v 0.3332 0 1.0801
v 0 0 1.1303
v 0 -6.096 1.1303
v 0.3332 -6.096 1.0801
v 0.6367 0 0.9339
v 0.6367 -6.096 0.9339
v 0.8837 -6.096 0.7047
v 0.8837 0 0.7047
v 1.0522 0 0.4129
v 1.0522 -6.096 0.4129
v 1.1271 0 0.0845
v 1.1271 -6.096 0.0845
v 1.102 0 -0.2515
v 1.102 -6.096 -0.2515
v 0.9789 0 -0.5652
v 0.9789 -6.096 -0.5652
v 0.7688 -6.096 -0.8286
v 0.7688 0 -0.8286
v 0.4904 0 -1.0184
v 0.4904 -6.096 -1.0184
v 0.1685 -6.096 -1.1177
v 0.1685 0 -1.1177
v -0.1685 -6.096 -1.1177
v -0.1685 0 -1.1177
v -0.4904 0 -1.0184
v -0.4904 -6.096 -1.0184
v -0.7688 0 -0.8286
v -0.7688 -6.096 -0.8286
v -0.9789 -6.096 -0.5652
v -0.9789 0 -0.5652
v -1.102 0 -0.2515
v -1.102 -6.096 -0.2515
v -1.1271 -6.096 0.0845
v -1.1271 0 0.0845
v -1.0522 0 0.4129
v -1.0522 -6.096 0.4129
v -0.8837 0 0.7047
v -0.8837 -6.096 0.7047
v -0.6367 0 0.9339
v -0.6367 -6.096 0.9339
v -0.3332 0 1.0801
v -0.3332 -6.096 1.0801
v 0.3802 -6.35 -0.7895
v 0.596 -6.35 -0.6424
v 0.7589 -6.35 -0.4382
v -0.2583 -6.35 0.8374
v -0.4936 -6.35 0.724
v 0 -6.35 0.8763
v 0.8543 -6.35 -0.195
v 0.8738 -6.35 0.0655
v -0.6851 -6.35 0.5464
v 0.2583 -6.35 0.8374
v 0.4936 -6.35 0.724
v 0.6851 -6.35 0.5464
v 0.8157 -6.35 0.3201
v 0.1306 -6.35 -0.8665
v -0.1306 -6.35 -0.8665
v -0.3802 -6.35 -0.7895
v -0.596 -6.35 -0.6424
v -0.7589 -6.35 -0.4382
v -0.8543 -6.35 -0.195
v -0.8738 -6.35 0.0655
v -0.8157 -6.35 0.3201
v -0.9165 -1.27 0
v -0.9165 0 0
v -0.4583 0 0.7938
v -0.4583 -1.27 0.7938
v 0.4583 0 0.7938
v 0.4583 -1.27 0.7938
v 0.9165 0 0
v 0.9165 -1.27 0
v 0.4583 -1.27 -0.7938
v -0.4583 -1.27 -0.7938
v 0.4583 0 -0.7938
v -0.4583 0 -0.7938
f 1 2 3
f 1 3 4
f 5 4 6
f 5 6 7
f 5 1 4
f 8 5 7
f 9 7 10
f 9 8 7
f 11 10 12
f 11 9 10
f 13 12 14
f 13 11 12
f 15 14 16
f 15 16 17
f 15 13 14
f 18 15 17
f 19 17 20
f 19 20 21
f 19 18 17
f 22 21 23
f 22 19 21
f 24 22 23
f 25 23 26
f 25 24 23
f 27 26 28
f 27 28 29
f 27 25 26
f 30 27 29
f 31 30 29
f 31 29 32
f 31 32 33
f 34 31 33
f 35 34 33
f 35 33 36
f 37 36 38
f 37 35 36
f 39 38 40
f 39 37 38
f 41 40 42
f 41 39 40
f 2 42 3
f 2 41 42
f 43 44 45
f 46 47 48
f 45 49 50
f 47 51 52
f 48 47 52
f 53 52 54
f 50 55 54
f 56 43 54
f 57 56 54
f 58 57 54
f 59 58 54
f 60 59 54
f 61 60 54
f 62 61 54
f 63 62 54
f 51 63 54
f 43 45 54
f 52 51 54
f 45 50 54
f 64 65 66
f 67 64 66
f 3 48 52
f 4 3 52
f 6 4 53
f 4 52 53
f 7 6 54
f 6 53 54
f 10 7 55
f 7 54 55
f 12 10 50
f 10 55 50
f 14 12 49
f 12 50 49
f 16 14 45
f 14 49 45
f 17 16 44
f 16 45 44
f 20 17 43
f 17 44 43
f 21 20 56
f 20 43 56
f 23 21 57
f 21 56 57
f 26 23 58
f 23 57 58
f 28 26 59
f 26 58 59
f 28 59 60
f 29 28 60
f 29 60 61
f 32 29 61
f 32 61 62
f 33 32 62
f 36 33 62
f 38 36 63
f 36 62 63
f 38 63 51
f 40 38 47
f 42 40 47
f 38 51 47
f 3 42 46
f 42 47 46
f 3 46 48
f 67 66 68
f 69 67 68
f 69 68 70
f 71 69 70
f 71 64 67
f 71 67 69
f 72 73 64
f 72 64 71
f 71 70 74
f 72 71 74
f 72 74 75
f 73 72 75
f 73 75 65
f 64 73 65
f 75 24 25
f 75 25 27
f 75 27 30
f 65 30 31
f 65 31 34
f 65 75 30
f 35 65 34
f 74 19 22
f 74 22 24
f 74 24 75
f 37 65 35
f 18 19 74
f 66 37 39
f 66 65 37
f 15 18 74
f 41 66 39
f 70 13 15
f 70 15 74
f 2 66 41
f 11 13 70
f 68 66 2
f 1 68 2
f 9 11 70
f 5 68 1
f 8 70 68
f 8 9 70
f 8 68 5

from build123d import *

# Parameters (mm, degrees)
SKETCH1_R           = 1.1303
BOSS_EXTRUDE1_DEPTH = 6.35
CHAMFER1_SIZE       = 0.254
CUT_EXTRUDE1_DEPTH  = 1.27


with BuildPart() as part:
    # Sketch1 → Boss-Extrude1 (new body)
    with BuildSketch(Plane(origin=(0, 0, 0), x_dir=(1, 0, 0), z_dir=(0, 1, 0))):
        with Locations(Location((0, 0, 0), (0, 0, 270))):
            Circle(SKETCH1_R)
    extrude(amount=-BOSS_EXTRUDE1_DEPTH)

    # Chamfer1
    chamfer1_edges = [part.edges().sort_by_distance(p)[0] for p in [
        (0, -6.35, -1.1303),
    ]]
    chamfer(chamfer1_edges, length=CHAMFER1_SIZE)

    # Sketch2 → Cut-Extrude1 (cut)
    with BuildSketch(Plane(origin=(0, 0, 0), x_dir=(1, 0, 0), z_dir=(0, 1, 0))):
        Polygon((-0.916543552, 0), (-0.458271776, -0.79375), (0.458271776, -0.79375), (0.916543552, 0), (0.458271776, 0.79375), (-0.458271776, 0.79375), align=None)
    extrude(amount=-CUT_EXTRUDE1_DEPTH, mode=Mode.SUBTRACT)


solid = part.part
